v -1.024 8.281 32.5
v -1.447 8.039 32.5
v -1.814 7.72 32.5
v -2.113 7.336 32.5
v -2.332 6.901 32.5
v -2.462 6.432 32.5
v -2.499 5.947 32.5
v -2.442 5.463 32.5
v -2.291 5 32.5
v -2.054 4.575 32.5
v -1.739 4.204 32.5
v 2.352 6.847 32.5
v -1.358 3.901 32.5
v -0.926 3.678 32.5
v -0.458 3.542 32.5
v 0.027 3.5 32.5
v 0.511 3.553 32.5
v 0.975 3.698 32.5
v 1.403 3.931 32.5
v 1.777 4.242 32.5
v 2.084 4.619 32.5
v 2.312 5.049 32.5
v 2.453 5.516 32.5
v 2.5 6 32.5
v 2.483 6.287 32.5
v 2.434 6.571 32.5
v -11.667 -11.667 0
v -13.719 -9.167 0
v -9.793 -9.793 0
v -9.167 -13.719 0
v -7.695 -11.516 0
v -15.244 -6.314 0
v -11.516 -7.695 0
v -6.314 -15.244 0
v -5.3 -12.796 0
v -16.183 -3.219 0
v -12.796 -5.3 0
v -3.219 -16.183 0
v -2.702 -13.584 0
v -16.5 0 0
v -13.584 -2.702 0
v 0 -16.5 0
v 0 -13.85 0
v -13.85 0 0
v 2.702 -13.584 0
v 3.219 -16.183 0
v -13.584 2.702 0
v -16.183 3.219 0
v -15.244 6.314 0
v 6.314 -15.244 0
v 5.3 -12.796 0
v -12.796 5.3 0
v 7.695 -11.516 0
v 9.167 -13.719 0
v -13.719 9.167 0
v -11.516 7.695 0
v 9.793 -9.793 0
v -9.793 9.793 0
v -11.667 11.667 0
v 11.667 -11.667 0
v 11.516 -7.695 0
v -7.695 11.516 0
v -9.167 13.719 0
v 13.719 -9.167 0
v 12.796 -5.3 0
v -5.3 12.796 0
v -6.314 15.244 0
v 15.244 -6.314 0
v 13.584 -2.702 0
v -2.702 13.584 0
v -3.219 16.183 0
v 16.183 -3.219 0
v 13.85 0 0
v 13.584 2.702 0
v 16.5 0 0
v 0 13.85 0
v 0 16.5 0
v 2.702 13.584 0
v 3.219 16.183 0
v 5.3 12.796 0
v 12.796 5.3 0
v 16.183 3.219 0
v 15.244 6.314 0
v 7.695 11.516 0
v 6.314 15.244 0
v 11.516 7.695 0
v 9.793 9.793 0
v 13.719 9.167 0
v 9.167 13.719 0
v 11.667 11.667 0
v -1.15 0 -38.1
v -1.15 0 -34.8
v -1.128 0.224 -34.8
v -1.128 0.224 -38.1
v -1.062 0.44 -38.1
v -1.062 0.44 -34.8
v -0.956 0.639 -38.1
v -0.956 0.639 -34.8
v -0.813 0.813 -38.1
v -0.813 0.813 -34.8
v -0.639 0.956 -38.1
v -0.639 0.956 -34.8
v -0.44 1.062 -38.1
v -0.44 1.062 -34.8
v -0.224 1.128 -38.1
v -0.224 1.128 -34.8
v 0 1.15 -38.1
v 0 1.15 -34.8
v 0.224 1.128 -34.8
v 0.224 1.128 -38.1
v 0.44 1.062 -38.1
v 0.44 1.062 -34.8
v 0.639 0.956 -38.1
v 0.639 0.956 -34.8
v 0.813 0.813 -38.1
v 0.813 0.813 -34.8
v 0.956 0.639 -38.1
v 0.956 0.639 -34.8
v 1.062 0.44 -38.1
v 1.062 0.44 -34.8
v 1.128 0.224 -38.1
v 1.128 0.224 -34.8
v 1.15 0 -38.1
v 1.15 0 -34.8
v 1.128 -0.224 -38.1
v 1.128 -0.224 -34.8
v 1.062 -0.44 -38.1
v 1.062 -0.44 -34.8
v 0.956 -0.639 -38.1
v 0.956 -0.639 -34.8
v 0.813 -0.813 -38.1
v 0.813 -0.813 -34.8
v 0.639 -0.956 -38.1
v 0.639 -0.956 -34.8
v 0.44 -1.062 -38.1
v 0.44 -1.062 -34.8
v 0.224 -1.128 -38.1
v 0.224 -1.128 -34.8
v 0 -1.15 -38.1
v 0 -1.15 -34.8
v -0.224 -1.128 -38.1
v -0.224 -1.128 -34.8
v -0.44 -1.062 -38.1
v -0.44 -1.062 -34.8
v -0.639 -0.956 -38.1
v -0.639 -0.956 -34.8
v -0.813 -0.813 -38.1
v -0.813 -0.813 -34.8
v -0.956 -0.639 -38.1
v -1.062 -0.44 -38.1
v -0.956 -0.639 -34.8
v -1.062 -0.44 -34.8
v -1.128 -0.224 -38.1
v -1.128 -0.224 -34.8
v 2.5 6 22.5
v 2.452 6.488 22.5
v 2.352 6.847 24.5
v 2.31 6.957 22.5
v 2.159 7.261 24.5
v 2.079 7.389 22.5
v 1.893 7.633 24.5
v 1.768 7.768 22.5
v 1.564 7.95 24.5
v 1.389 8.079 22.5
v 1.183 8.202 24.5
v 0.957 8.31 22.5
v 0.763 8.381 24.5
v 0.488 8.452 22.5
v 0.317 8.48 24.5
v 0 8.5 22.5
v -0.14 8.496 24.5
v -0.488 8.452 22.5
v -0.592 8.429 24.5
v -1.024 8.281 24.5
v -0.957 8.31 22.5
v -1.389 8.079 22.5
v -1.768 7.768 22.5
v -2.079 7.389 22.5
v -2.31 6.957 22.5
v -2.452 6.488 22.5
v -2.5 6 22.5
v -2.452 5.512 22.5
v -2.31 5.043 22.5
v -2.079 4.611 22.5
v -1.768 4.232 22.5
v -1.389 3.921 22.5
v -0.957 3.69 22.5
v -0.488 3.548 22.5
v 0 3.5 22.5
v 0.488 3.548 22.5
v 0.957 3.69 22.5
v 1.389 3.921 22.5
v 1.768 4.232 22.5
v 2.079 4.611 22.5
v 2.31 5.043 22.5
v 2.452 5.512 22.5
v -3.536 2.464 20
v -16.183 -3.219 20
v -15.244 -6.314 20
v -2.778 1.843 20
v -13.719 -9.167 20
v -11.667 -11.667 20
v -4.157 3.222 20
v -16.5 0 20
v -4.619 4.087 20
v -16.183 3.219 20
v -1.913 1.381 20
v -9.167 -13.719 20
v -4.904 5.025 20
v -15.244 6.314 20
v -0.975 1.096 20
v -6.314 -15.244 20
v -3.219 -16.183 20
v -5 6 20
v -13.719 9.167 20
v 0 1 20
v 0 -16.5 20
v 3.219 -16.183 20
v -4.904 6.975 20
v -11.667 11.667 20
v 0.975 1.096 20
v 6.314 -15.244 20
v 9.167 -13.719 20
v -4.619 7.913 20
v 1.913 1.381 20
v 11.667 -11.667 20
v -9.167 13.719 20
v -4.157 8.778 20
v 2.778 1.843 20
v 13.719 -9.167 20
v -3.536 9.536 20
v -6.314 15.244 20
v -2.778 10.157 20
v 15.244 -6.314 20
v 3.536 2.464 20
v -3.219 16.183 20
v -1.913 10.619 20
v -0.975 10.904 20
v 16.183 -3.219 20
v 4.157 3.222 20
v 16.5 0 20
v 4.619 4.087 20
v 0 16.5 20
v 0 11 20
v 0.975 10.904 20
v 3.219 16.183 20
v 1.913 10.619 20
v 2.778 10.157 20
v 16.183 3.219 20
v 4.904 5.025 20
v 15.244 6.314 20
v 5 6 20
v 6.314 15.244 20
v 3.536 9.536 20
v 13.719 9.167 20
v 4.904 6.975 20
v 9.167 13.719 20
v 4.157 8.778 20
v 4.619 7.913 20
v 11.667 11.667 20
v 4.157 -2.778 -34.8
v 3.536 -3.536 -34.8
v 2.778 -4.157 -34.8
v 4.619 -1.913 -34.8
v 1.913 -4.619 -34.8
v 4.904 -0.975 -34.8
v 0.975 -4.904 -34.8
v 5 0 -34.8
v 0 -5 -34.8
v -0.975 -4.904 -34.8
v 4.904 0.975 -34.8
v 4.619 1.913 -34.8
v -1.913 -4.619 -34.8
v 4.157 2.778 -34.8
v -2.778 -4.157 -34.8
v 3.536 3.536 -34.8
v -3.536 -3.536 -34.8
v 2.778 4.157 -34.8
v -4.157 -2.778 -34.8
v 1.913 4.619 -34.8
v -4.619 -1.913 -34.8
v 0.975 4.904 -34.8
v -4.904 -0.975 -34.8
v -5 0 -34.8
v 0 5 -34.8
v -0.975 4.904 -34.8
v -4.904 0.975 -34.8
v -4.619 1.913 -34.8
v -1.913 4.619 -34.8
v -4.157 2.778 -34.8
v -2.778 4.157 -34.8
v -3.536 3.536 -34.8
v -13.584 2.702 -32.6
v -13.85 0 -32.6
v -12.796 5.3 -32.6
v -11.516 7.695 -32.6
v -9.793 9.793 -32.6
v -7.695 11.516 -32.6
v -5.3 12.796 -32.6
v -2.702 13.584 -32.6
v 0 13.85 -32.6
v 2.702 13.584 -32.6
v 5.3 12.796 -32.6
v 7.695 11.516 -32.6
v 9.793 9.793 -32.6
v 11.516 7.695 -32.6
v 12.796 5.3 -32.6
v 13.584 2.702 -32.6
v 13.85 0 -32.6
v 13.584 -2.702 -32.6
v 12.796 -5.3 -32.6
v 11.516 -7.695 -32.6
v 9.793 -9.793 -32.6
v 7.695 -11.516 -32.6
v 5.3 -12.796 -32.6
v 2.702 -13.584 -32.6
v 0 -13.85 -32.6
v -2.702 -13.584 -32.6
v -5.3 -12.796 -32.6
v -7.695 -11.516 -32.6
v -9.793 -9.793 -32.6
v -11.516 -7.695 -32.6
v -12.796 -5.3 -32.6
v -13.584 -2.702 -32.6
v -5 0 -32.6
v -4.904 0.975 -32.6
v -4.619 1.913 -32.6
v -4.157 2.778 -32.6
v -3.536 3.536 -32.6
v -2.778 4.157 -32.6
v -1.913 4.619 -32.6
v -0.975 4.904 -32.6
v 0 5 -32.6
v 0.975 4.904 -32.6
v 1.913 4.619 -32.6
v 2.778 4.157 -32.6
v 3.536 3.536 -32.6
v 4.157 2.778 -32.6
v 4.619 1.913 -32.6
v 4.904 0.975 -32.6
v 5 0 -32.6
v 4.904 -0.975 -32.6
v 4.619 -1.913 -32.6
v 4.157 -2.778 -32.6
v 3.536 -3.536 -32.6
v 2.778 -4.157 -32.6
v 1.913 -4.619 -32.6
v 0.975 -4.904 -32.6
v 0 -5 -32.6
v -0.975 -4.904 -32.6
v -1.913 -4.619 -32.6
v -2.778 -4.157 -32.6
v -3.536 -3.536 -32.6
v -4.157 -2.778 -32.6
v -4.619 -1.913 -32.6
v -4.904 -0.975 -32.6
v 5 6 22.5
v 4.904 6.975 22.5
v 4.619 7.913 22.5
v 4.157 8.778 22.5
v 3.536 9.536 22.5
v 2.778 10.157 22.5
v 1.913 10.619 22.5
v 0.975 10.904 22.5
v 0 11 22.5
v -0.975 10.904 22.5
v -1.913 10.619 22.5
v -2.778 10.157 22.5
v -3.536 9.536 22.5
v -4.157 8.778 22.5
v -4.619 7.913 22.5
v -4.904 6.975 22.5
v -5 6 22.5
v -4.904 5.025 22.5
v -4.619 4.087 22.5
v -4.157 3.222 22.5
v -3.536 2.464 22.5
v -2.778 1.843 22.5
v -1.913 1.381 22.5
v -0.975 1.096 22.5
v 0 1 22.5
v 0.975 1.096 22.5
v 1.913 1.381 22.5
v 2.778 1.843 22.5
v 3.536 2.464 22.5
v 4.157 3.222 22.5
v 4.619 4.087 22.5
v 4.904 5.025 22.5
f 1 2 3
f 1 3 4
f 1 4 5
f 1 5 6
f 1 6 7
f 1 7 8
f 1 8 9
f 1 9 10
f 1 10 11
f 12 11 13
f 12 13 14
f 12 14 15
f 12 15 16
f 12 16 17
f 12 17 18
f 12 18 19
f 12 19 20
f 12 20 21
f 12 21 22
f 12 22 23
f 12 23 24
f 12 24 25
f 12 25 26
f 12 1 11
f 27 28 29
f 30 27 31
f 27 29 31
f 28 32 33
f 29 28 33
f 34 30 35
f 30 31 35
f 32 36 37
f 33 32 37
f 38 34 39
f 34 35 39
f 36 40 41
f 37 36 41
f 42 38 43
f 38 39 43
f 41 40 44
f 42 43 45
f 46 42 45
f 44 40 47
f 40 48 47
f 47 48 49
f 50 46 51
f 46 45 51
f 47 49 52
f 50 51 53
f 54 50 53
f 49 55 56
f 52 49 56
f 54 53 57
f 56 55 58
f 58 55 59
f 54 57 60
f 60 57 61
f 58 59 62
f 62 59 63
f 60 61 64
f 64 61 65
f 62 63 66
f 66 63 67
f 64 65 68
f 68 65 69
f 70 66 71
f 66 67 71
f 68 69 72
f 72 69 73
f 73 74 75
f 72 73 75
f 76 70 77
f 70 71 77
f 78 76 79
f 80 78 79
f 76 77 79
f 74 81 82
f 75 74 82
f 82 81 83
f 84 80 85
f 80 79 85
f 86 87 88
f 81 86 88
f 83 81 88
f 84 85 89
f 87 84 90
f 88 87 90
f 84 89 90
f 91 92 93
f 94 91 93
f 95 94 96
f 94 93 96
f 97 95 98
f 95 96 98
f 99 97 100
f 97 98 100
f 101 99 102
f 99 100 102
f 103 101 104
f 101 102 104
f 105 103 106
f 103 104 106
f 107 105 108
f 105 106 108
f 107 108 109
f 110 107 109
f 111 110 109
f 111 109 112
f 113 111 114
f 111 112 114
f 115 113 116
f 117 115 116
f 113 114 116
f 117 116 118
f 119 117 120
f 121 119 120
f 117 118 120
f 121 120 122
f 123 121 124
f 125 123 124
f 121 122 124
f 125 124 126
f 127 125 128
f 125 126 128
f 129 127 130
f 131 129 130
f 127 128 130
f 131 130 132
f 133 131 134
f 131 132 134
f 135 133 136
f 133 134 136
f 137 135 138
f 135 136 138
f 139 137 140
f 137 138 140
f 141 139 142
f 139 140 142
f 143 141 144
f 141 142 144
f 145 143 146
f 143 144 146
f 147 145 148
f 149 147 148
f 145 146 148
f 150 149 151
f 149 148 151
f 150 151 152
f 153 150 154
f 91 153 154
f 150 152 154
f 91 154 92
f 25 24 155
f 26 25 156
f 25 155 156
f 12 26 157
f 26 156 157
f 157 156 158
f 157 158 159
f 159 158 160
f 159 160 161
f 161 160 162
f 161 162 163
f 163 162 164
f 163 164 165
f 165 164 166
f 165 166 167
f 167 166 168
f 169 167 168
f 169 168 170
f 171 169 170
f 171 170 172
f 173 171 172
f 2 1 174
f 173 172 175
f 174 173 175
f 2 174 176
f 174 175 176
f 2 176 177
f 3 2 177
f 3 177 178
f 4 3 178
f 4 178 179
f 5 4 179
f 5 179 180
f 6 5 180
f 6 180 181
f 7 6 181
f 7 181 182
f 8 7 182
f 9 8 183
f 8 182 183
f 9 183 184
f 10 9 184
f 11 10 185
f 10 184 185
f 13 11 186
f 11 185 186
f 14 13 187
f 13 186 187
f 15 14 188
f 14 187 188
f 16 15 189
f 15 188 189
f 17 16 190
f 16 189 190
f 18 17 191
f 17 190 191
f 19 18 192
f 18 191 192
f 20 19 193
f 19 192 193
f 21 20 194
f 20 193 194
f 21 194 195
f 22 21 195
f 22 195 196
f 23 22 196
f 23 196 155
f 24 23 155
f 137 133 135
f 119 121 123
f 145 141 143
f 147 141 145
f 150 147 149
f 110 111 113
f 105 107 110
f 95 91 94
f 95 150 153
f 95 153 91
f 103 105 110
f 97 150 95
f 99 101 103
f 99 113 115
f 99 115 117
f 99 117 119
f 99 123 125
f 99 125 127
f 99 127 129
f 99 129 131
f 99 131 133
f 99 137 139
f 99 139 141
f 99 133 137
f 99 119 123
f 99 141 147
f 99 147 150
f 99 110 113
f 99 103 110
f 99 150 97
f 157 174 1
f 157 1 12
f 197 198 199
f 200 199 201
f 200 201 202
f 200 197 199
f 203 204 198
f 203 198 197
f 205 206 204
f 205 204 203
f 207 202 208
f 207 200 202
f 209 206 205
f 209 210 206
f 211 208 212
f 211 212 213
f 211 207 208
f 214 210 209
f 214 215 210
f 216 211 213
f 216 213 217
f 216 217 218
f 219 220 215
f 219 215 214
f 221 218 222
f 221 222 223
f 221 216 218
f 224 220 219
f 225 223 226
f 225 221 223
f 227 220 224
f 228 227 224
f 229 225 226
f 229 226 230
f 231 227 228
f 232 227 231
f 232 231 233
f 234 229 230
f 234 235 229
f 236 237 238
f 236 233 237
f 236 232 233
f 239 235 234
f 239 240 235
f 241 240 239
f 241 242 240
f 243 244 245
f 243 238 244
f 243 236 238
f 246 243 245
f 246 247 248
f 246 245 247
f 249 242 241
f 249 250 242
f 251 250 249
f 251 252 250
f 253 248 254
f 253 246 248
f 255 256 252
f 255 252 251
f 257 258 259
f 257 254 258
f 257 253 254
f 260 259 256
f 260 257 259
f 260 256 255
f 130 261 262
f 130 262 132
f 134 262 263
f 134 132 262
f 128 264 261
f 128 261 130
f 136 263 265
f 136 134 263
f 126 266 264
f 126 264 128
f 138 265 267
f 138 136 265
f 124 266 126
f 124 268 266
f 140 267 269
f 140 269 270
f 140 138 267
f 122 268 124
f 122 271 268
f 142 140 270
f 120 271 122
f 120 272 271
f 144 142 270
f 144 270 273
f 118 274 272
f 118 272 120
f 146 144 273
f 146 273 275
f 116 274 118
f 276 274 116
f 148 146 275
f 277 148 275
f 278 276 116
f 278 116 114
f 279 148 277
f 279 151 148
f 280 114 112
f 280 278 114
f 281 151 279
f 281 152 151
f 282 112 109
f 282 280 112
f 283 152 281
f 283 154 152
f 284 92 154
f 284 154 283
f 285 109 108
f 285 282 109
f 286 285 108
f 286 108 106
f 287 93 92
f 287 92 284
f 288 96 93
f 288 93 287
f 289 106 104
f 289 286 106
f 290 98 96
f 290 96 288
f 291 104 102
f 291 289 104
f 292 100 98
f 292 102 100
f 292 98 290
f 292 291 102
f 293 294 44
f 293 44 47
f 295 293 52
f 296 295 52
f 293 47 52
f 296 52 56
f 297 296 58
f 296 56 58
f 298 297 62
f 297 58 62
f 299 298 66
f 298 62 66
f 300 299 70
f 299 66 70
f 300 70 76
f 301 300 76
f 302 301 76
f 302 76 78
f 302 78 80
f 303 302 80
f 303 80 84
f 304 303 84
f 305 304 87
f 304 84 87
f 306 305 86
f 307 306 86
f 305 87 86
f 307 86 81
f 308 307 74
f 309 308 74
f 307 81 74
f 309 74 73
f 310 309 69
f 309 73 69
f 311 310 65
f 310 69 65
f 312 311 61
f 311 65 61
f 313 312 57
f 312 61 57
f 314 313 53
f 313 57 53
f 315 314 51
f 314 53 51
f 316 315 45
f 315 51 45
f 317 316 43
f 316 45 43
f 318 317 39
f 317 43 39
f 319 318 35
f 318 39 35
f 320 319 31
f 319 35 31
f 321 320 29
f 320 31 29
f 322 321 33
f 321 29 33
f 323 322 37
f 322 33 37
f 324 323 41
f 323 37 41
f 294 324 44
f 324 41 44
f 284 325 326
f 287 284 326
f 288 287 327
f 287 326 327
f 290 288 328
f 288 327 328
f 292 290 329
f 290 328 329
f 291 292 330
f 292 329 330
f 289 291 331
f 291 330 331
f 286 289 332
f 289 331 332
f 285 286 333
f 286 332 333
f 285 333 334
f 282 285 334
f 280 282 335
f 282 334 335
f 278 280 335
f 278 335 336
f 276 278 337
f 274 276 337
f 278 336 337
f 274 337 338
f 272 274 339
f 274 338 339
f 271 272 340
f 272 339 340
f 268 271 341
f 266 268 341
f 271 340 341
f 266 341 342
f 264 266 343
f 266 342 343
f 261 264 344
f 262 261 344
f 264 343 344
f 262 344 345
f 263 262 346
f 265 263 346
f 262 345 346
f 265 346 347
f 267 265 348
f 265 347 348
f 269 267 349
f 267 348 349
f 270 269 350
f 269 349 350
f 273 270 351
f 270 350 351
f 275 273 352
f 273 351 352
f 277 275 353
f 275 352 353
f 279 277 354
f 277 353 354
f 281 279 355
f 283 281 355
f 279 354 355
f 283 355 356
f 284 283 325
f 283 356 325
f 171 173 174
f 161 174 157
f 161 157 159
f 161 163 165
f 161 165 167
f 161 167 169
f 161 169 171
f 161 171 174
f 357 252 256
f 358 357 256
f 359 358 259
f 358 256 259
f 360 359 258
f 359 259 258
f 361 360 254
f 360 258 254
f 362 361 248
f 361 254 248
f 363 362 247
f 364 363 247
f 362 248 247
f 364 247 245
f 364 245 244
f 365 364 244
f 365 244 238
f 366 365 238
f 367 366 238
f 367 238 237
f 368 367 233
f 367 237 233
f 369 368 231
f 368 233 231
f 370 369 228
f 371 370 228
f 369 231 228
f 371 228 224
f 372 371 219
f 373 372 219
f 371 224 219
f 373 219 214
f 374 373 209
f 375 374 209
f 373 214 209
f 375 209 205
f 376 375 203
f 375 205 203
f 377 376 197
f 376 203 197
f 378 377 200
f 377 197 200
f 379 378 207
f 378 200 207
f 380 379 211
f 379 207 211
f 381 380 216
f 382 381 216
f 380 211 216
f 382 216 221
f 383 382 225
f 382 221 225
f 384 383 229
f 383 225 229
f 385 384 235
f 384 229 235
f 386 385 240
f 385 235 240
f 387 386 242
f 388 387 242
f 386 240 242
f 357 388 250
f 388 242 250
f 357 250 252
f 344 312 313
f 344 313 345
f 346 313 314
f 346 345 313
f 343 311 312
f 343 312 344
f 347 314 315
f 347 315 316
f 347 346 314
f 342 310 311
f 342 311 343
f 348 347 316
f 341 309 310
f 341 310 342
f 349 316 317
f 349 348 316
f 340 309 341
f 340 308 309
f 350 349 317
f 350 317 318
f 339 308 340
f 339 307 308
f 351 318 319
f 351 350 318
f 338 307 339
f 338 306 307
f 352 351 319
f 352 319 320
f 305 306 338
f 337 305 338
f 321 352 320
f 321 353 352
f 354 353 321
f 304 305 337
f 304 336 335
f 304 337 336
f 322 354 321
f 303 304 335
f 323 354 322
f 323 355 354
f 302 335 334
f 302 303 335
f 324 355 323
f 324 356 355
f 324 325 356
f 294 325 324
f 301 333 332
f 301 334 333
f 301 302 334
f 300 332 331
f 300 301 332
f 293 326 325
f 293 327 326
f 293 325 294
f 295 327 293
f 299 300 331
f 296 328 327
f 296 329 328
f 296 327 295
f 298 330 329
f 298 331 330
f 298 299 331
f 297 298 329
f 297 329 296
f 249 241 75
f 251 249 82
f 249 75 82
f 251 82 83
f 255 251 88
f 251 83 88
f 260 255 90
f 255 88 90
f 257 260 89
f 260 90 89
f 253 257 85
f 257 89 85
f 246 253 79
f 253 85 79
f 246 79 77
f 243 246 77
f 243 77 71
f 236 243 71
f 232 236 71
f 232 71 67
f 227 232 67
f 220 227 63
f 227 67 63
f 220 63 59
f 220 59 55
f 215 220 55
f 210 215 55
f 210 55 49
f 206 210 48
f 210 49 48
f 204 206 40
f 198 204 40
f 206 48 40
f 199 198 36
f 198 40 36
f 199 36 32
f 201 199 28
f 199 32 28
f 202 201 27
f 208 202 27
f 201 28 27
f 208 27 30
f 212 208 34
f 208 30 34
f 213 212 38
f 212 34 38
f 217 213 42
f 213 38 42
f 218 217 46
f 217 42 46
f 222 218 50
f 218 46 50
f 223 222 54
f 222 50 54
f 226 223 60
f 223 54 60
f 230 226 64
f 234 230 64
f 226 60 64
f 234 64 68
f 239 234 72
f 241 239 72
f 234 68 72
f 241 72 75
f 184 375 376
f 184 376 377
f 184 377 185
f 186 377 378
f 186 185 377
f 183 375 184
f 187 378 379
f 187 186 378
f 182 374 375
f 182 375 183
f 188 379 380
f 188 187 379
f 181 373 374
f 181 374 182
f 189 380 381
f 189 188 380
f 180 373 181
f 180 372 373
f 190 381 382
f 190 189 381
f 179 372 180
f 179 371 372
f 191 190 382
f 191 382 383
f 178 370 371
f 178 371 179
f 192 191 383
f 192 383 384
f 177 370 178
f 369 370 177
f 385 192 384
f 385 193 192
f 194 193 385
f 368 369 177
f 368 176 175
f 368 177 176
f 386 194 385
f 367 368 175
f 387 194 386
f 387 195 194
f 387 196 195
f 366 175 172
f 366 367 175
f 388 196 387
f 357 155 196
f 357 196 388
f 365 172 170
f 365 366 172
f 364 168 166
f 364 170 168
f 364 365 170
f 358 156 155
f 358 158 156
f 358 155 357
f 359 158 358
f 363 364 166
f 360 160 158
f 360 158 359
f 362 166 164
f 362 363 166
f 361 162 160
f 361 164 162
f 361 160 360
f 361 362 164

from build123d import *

# Parameters (mm, degrees)
SKETCH1_R           = 16.5
BOSS_EXTRUDE1_DEPTH = 20
SKETCH2_R           = 13.85
BOSS_EXTRUDE2_DEPTH = 32.6
SKETCH3_R           = 5
BOSS_EXTRUDE3_DEPTH = 2.2
SKETCH4_R           = 1.15
BOSS_EXTRUDE4_DEPTH = 3.3
SKETCH5_R           = 5
BOSS_EXTRUDE5_DEPTH = 2.5
SKETCH6_R           = 2.5
BOSS_EXTRUDE6_DEPTH = 10
CUT_EXTRUDE1_START  = -8
CUT_EXTRUDE1_DEPTH  = 8


with BuildPart() as part:
    # Sketch1 → Boss-Extrude1 (new body)
    with BuildSketch(Plane.XY):
        Circle(SKETCH1_R)
    extrude(amount=BOSS_EXTRUDE1_DEPTH)

    # Sketch2 → Boss-Extrude2 (add)
    with BuildSketch(Plane(origin=(0, 0, 0), x_dir=(-1, 0, 0), z_dir=(0, 0, -1))):
        Circle(SKETCH2_R)
    extrude(amount=BOSS_EXTRUDE2_DEPTH)

    # Sketch3 → Boss-Extrude3 (add)
    with BuildSketch(Plane(origin=(0, 0, -32.6), x_dir=(-1, 0, 0), z_dir=(0, 0, -1))):
        Circle(SKETCH3_R)
    extrude(amount=BOSS_EXTRUDE3_DEPTH)

    # Sketch4 → Boss-Extrude4 (add)
    with BuildSketch(Plane(origin=(0, 0, -34.8), x_dir=(-1, 0, 0), z_dir=(0, 0, -1))):
        Circle(SKETCH4_R)
    extrude(amount=BOSS_EXTRUDE4_DEPTH)

    # Sketch5 → Boss-Extrude5 (add)
    with BuildSketch(Plane.XY.offset(20)):
        with Locations((0, 6)):
            Circle(SKETCH5_R)
    extrude(amount=BOSS_EXTRUDE5_DEPTH)

    # Sketch6 → Boss-Extrude6 (add)
    with BuildSketch(Plane.XY.offset(22.5)):
        with Locations((0, 6)):
            Circle(SKETCH6_R)
    extrude(amount=BOSS_EXTRUDE6_DEPTH)

    # Sketch7 → Cut-Extrude1 (cut)
    with BuildSketch(Plane.XY.offset(32.5).offset(CUT_EXTRUDE1_START)):
        with BuildLine():
            Line((-1.024171461, 8.280586069), (2.352192857, 6.84686998))
            ThreePointArc((2.352192857, 6.84686998), (0.977136461, 8.301131099), (-1.024171461, 8.280586069))
        make_face()
    extrude(amount=CUT_EXTRUDE1_DEPTH, mode=Mode.SUBTRACT)


solid = part.part
